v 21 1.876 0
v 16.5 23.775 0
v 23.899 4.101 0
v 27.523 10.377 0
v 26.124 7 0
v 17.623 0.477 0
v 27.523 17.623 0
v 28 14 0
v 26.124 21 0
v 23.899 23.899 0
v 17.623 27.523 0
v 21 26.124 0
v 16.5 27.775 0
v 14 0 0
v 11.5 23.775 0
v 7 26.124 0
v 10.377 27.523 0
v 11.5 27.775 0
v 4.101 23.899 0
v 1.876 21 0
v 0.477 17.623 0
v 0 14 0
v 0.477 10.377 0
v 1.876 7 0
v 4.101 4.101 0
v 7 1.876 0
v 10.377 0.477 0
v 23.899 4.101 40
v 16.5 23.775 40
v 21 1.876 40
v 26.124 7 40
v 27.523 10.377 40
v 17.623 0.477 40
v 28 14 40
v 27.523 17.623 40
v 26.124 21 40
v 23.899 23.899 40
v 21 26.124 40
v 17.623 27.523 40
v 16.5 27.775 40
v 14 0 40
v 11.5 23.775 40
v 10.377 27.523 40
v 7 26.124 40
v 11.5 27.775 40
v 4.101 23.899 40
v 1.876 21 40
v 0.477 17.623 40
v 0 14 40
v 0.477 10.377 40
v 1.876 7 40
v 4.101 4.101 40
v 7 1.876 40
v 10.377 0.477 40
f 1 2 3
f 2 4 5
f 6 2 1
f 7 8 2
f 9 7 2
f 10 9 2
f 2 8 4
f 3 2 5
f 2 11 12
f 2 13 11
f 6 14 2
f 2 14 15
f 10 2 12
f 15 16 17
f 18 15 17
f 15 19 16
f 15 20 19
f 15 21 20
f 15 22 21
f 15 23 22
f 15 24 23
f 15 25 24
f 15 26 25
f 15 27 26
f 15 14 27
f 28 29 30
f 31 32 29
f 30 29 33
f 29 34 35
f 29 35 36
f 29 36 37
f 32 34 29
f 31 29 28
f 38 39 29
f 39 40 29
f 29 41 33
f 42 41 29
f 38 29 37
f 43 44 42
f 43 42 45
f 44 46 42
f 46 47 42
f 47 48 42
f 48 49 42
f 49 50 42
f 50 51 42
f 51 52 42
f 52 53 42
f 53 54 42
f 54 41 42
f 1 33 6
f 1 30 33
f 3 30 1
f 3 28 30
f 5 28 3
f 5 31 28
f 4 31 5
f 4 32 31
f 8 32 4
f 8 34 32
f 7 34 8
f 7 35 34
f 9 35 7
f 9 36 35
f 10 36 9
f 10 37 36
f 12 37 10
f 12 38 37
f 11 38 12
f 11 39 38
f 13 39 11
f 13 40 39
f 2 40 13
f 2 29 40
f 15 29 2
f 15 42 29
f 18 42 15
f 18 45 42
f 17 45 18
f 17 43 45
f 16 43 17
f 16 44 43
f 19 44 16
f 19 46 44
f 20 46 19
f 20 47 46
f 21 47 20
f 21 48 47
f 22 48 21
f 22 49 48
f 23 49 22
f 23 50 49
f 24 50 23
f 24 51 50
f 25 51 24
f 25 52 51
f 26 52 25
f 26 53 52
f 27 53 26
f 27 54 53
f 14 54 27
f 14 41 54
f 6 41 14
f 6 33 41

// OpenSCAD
$fn = 32;

// ----------------------------------------------------------------------
// Keyway shaft: d28 shaft, key 5 x 4 mm
// ----------------------------------------------------------------------

// --- parameters (mm) ---
shaft_r = 14;             // shaft radius
key_w = 5;                // keyway width
key_d = 4;                // keyway depth below the surface line
plate_t = 40;             // shaft length, Z (extrusion height)
fit_tol = 0.05;           // declared fit tolerance (prompt contract)
free_tol = 0.3;           // declared free tolerance (prompt contract)

shaft_d = 2 * shaft_r;  // shaft diameter
circle_step = 15;  // polygon sampling step, degrees

profile = [[10.377, 27.523], [7, 26.124], [4.101, 23.899], [1.876, 21], [0.477, 17.623], [0, 14], [0.477, 10.377], [1.876, 7], [4.101, 4.101], [7, 1.876], [10.377, 0.477], [14, 0], [17.623, 0.477], [21, 1.876], [23.899, 4.101], [26.124, 7], [27.523, 10.377], [28, 14], [27.523, 17.623], [26.124, 21], [23.899, 23.899], [21, 26.124], [17.623, 27.523], [16.5, 27.775], [16.5, 23.775], [11.5, 23.775], [11.5, 27.775]];  // primary outline, 27 points, counter clockwise

// --- the one profile operation ---
linear_extrude(height = plate_t) polygon(points = profile);
